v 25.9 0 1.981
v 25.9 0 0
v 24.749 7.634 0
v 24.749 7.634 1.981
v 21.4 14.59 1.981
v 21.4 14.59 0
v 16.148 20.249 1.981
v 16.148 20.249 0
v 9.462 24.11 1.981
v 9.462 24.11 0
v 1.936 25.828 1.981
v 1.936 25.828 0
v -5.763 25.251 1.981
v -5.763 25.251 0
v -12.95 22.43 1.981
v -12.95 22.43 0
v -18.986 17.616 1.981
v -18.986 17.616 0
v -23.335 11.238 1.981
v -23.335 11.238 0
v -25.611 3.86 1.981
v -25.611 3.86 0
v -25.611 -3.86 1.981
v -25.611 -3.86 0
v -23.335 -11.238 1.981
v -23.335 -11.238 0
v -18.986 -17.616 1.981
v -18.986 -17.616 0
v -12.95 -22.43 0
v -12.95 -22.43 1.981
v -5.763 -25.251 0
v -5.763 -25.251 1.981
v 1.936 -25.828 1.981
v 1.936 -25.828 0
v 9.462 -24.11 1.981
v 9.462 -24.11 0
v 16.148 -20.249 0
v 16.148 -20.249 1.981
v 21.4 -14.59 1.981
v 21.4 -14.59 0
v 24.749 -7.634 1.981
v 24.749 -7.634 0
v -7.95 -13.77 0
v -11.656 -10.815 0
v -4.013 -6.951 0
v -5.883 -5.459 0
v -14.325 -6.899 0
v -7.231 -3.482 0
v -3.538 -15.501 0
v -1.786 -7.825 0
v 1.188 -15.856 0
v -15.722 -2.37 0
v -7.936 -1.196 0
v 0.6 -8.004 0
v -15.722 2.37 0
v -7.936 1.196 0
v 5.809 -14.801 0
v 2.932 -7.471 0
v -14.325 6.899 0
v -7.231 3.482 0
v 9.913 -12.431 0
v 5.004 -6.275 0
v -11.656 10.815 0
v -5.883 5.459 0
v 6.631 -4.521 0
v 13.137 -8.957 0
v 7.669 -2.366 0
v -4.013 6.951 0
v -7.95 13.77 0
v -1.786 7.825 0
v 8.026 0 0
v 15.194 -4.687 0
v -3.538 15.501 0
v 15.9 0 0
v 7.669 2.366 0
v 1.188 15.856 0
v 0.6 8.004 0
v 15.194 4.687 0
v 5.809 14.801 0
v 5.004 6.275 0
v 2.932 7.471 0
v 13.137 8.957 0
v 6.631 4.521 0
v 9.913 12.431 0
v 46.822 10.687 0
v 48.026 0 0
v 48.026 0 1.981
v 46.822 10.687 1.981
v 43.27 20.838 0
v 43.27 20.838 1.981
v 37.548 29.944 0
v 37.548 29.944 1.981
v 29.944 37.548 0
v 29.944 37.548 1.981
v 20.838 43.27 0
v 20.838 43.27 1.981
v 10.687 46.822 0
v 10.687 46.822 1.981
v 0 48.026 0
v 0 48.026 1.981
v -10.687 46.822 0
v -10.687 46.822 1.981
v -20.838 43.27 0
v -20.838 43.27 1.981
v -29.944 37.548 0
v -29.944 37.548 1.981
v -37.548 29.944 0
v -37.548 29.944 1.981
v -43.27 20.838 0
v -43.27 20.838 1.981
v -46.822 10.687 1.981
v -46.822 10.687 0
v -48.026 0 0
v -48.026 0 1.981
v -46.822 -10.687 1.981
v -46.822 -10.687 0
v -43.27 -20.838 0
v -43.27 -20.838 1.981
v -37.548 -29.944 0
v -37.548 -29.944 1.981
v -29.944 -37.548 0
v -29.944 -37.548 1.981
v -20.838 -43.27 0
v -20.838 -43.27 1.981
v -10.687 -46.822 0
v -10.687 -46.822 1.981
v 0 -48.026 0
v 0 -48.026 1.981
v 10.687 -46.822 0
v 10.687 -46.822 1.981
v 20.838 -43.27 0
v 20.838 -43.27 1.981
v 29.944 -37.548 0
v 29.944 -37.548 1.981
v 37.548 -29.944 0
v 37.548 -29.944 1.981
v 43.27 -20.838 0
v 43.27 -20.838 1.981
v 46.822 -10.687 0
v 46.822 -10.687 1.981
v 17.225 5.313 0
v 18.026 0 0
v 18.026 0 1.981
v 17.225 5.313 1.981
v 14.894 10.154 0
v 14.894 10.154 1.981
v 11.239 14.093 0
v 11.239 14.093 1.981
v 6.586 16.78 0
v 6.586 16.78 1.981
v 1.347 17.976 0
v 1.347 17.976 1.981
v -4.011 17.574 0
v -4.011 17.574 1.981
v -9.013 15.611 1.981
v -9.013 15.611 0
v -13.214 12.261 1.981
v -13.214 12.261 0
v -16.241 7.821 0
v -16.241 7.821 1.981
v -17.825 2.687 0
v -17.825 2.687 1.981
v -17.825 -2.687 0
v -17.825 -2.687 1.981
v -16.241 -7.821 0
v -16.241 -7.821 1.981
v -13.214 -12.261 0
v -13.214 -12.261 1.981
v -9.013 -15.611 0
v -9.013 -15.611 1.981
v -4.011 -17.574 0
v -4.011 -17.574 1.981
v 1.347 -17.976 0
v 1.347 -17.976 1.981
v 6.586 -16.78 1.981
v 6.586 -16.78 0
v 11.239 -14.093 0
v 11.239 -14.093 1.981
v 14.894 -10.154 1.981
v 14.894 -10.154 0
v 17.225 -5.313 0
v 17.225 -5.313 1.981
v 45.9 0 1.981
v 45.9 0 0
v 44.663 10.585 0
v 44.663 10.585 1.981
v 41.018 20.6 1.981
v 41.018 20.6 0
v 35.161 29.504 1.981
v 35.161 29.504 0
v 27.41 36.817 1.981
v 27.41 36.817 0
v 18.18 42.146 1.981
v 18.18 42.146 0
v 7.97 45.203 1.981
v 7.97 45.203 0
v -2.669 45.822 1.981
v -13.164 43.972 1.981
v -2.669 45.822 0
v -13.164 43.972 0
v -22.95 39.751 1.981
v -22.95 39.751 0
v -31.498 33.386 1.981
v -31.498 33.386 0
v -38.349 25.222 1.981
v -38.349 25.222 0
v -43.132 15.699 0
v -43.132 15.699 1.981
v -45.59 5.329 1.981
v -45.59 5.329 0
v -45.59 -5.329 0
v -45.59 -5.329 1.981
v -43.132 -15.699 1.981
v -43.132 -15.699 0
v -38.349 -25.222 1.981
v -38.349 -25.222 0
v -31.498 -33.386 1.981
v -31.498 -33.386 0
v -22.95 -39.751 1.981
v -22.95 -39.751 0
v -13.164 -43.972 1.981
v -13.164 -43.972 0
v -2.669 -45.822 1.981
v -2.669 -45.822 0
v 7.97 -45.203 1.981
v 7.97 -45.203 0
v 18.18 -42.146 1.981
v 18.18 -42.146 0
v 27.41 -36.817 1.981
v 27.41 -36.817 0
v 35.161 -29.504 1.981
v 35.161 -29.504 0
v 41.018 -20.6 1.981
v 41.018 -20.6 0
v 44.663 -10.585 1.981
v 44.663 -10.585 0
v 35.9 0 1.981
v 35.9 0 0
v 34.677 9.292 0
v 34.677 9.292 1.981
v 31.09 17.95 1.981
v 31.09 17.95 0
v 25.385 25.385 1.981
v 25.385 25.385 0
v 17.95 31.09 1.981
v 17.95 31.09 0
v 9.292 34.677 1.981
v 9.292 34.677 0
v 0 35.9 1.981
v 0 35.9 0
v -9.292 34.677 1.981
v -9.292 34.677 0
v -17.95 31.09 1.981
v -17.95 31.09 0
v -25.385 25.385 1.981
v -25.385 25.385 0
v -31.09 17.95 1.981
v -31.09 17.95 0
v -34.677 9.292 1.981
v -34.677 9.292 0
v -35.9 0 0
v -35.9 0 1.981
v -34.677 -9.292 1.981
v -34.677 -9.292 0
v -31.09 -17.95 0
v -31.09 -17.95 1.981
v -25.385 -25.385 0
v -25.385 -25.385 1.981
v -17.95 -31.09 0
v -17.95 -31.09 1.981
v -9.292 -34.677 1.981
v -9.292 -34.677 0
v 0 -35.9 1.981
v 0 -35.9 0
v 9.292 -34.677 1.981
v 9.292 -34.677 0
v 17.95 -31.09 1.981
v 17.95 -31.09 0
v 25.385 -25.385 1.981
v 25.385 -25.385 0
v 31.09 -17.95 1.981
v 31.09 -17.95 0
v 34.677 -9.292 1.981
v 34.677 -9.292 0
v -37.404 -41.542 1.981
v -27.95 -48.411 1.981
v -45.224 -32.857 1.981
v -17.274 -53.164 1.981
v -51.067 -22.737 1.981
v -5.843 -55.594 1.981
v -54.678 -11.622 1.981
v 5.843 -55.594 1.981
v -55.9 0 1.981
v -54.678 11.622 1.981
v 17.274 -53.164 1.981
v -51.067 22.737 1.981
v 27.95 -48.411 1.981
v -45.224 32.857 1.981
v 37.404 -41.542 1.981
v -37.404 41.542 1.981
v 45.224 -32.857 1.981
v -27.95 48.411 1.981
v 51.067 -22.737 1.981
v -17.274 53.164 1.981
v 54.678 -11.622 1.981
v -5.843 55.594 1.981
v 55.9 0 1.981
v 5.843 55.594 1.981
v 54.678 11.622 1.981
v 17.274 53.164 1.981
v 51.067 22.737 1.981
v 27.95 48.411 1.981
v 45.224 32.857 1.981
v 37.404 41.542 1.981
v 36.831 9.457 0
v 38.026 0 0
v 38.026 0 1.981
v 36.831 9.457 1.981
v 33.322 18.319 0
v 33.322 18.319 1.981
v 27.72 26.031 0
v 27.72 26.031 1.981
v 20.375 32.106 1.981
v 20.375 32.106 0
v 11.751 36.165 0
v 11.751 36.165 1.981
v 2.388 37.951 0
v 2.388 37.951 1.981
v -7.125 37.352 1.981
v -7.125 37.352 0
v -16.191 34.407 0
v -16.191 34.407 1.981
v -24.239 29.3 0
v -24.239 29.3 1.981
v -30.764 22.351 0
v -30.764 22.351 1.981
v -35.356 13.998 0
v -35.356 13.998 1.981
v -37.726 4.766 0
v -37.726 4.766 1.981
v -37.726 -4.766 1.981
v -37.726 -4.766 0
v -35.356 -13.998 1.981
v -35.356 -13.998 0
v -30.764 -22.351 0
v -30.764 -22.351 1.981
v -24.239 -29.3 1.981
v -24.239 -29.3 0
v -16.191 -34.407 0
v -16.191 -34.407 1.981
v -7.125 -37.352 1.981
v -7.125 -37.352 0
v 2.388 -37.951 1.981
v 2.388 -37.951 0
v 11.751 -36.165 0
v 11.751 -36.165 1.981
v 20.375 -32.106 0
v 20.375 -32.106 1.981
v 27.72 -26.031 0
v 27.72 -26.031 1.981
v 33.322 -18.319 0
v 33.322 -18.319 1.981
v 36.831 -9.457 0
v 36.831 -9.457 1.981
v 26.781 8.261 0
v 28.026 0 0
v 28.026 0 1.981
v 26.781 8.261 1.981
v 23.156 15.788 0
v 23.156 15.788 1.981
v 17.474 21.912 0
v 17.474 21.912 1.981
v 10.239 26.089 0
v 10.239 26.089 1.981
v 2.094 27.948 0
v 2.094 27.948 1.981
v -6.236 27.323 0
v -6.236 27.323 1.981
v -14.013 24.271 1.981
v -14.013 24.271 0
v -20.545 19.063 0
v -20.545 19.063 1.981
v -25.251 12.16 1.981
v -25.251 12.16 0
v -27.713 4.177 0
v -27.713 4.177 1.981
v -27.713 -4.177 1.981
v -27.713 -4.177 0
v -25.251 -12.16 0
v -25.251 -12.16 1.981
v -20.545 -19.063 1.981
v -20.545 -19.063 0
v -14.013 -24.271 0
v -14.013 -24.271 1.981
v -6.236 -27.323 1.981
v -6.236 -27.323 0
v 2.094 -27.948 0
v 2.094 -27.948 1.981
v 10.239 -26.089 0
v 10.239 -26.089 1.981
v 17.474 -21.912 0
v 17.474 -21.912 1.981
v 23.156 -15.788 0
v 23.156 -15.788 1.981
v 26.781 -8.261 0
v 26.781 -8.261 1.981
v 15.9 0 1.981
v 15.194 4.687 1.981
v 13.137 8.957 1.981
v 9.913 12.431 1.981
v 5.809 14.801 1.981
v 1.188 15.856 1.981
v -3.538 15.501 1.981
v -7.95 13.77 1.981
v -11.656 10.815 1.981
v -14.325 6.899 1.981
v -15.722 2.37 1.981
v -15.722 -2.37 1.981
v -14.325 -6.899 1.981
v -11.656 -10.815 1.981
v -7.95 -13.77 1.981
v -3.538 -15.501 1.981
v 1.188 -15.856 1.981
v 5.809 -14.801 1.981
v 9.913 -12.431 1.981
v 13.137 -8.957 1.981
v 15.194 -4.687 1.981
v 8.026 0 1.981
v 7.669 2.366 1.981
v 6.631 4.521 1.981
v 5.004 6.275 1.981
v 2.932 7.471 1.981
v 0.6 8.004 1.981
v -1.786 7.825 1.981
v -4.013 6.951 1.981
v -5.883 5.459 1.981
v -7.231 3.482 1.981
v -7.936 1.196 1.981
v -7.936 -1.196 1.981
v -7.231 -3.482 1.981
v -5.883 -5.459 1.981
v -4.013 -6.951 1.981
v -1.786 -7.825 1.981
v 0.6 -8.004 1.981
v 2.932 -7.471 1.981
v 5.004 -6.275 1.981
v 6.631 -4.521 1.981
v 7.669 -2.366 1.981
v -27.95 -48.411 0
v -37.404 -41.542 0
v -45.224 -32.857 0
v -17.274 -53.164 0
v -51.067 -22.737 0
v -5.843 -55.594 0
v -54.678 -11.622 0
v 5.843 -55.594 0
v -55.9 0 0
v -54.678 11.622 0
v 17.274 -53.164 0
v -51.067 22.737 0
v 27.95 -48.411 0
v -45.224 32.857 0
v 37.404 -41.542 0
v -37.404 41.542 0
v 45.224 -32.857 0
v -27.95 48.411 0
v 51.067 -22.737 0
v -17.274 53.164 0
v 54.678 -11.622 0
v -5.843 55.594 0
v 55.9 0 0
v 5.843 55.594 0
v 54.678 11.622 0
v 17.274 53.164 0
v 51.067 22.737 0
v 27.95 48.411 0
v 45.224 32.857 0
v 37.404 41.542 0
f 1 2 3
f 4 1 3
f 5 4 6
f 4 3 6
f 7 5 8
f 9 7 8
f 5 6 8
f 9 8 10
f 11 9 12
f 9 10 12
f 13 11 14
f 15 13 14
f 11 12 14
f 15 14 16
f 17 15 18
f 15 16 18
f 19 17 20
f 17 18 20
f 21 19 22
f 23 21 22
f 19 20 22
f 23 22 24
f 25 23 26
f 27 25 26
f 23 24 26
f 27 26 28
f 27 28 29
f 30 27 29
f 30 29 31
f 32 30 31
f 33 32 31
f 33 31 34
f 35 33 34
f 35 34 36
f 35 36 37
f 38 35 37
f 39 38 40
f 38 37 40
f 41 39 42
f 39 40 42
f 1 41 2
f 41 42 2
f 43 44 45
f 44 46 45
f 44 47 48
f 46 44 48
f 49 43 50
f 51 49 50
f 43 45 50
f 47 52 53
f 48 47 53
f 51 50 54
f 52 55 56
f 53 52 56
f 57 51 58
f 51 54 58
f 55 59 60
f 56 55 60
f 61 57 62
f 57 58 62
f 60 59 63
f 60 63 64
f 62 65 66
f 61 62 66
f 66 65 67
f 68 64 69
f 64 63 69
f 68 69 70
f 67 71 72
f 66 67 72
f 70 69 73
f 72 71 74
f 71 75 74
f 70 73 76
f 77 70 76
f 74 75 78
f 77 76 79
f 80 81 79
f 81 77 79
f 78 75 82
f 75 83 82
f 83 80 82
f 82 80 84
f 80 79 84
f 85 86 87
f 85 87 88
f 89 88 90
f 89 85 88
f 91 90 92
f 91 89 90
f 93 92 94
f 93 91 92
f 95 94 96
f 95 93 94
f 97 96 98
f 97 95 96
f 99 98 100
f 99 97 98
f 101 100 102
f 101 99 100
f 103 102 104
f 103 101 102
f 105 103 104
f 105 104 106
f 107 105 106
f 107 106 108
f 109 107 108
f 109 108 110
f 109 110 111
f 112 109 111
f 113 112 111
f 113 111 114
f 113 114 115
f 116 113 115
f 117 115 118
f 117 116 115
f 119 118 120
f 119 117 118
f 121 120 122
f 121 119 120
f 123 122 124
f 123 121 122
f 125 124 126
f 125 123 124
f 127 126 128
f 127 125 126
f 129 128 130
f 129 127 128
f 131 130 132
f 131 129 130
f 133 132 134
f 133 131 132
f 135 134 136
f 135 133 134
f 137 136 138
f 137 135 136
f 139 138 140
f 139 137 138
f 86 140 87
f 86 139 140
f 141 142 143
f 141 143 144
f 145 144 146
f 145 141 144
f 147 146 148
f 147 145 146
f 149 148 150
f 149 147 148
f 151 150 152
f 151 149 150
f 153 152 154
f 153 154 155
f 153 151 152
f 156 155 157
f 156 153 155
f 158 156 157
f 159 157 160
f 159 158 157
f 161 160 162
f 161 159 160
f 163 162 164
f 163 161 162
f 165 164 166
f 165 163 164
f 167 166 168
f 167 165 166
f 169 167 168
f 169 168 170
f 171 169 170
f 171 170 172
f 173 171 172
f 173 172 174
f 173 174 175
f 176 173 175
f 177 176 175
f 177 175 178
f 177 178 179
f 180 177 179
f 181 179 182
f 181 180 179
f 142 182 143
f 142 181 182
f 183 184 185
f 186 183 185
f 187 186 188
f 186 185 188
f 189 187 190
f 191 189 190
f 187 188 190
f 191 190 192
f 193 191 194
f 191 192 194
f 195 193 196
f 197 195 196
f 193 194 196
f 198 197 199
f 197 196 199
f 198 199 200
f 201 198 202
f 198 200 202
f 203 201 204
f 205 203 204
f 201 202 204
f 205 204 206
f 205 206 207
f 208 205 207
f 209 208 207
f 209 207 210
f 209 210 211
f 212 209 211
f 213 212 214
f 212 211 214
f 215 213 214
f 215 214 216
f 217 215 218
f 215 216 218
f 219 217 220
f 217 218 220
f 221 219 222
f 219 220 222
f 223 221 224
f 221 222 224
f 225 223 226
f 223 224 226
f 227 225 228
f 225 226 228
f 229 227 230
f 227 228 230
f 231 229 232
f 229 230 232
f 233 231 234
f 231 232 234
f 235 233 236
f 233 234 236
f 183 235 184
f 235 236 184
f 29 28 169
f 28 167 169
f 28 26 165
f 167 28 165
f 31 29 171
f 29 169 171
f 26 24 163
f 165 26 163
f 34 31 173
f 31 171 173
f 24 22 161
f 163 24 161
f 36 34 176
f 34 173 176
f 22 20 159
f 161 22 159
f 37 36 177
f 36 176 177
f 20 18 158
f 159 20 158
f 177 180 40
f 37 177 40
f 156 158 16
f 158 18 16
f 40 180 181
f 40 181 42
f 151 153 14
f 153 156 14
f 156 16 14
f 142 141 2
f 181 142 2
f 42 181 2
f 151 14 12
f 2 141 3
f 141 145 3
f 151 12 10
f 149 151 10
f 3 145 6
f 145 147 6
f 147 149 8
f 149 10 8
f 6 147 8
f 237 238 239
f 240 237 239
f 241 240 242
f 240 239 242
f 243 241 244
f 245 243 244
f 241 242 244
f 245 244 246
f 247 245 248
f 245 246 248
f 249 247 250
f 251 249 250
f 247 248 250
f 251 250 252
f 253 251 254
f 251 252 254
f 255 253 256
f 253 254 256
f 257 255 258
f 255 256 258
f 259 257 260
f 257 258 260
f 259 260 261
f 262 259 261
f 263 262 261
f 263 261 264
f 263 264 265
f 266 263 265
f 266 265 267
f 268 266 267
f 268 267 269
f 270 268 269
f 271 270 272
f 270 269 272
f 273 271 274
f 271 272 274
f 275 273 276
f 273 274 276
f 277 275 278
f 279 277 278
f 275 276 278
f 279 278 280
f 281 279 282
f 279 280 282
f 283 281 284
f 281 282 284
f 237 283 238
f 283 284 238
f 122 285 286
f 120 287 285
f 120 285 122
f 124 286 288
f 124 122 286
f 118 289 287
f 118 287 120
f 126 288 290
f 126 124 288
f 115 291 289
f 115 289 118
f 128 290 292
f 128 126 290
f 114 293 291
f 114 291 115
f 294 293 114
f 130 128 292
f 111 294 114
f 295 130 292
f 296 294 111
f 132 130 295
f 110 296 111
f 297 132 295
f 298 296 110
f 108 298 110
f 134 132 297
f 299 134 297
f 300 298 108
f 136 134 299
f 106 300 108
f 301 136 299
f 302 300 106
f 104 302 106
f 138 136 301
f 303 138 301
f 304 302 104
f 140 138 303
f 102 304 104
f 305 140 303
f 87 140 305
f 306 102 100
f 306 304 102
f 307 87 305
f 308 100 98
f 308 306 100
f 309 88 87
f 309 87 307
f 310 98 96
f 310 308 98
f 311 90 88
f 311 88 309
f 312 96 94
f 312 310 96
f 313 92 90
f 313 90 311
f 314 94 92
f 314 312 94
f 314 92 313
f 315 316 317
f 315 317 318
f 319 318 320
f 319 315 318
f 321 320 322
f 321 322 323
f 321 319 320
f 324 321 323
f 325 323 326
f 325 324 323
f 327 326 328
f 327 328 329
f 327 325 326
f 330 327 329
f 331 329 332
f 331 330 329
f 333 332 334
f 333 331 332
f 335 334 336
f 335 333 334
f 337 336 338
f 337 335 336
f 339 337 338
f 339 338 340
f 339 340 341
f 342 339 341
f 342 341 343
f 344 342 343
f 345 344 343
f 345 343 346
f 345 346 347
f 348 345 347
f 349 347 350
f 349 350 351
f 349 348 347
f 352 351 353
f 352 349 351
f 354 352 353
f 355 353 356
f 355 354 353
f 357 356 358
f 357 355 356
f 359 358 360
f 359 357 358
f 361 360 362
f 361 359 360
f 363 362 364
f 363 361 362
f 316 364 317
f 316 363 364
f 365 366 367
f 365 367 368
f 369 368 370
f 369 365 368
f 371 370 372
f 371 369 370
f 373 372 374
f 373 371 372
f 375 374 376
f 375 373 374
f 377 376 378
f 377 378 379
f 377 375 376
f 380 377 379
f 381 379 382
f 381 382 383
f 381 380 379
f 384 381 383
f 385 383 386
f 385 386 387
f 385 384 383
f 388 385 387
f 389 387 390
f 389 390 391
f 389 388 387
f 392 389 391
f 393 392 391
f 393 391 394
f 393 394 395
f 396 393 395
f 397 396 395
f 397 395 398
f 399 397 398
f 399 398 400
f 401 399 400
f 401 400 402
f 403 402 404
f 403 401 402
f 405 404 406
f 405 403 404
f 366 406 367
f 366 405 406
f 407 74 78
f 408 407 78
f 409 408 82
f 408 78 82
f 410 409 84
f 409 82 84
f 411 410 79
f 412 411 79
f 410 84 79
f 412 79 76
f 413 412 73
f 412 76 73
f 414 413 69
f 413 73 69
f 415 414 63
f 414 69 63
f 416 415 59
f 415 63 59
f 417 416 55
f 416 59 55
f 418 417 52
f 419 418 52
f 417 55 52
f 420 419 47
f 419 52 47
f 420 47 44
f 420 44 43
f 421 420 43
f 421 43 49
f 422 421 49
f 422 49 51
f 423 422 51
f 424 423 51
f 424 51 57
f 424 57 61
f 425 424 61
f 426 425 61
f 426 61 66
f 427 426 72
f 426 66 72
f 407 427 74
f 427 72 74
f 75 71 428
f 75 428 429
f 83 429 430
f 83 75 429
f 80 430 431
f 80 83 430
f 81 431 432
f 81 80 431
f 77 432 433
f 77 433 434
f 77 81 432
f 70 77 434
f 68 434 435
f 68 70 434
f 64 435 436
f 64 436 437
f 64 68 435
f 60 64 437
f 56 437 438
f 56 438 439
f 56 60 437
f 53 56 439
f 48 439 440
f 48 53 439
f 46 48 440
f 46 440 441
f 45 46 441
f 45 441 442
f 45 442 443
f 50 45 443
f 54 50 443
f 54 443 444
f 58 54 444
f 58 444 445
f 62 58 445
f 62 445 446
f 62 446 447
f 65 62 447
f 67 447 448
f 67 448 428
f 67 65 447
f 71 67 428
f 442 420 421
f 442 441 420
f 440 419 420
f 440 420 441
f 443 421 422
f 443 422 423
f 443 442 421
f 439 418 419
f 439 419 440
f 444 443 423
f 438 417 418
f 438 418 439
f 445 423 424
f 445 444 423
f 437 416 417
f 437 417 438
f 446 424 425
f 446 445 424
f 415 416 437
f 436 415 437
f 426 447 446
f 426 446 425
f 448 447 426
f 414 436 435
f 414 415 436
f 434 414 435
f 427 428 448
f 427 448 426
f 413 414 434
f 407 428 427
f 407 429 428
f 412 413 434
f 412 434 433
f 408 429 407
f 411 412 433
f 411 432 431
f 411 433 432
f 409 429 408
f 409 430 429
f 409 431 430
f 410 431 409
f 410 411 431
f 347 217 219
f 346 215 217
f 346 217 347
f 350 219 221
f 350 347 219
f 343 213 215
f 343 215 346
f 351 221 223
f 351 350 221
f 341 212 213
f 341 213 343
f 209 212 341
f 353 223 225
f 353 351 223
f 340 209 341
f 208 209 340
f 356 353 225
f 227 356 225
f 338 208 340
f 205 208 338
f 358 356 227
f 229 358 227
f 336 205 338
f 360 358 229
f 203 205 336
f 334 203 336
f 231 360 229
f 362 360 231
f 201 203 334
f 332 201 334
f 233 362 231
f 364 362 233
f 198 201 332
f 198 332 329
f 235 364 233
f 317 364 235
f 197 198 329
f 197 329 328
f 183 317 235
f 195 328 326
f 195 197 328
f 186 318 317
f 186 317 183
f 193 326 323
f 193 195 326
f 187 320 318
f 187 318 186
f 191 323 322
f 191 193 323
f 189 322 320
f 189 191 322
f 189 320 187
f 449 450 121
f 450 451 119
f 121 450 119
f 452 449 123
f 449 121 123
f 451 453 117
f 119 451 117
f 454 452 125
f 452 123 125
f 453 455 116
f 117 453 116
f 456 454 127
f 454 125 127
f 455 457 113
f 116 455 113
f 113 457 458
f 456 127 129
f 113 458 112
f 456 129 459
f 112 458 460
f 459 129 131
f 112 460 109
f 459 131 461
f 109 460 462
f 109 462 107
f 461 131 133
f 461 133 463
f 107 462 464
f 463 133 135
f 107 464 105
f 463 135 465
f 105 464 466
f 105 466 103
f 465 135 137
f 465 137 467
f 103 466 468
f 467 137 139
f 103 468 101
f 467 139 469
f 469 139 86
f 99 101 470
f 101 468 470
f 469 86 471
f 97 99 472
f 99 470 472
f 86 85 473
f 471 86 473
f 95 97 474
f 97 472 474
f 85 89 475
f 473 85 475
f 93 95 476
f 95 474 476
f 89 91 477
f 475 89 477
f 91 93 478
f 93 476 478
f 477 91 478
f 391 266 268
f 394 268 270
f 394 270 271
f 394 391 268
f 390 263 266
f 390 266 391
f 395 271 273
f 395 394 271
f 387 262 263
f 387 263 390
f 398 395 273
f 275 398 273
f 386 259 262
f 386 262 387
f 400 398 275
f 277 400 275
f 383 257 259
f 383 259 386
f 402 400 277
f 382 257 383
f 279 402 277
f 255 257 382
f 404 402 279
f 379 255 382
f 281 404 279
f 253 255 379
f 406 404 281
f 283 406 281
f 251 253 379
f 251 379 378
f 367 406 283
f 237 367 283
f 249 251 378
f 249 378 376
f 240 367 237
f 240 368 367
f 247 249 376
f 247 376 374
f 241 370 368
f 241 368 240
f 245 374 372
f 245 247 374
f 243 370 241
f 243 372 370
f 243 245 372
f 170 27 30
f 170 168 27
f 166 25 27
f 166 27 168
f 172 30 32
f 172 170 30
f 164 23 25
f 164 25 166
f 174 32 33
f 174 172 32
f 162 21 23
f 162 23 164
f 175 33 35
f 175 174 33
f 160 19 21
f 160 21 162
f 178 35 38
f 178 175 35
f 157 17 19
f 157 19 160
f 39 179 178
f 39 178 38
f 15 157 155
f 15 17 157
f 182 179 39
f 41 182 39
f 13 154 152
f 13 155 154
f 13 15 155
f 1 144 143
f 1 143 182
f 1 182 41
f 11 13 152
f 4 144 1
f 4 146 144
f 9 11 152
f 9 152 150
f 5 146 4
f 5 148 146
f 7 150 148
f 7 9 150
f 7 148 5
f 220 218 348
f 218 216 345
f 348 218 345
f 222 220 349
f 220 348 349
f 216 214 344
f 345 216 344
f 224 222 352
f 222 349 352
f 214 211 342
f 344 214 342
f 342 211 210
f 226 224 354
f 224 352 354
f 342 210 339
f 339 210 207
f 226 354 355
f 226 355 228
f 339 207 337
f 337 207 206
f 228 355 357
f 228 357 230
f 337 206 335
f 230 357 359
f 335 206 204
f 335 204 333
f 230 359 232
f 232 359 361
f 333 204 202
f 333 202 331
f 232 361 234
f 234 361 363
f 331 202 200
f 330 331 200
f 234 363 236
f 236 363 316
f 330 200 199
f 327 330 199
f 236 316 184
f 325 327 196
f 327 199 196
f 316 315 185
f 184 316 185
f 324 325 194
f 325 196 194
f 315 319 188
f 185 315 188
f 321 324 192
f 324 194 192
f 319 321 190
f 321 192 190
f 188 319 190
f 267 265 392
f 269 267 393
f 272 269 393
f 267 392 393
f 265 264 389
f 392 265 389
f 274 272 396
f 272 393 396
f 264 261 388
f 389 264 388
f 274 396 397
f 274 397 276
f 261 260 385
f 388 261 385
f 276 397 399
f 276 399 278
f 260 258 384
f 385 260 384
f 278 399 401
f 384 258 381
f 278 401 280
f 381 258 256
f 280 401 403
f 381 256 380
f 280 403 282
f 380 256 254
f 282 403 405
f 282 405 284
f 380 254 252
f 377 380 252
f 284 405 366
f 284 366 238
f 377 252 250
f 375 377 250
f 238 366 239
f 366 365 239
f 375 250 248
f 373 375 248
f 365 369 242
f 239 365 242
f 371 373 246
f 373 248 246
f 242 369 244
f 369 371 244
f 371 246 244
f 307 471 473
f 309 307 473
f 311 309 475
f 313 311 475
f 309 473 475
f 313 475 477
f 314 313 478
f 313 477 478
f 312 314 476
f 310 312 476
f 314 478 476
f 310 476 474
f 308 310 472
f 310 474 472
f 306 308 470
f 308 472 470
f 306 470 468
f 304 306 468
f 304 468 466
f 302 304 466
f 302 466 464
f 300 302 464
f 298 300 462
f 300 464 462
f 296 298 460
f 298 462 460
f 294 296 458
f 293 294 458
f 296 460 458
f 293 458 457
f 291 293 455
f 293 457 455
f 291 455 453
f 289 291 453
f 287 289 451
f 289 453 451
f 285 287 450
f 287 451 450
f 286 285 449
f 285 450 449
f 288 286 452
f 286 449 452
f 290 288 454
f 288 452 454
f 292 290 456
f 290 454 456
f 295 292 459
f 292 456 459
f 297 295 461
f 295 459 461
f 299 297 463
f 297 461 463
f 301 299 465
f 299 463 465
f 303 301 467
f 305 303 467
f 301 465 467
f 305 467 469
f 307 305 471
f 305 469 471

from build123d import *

# Parameters (mm, degrees)
SKETCH1_R             = 55.9
SKETCH1_R_2           = 48.026
BOSS_EXTRUDE1_DEPTH   = 1.9812
SKETCH1_R_3           = 45.9
SKETCH1_R_4           = 38.026
BOSS_EXTRUDE1_2_DEPTH = 1.9812
SKETCH1_R_5           = 35.9
SKETCH1_R_6           = 28.026
BOSS_EXTRUDE1_3_DEPTH = 1.9812
SKETCH1_R_7           = 25.9
SKETCH1_R_8           = 18.026
BOSS_EXTRUDE1_4_DEPTH = 1.9812
SKETCH1_R_9           = 15.9
SKETCH1_R_10          = 8.026
BOSS_EXTRUDE1_5_DEPTH = 1.9812


with BuildPart() as part:
    # Sketch1 → Boss-Extrude1 (new body)
    with BuildSketch(Plane.XY):
        Circle(SKETCH1_R)
        Circle(SKETCH1_R_2, mode=Mode.SUBTRACT)
    extrude(amount=BOSS_EXTRUDE1_DEPTH)


with BuildPart() as body_2:
    # Sketch1 → Boss-Extrude1 2 (new body)
    with BuildSketch(Plane.XY):
        Circle(SKETCH1_R_3)
        Circle(SKETCH1_R_4, mode=Mode.SUBTRACT)
    extrude(amount=BOSS_EXTRUDE1_2_DEPTH)


with BuildPart() as body_3:
    # Sketch1 → Boss-Extrude1 3 (new body)
    with BuildSketch(Plane.XY):
        Circle(SKETCH1_R_5)
        Circle(SKETCH1_R_6, mode=Mode.SUBTRACT)
    extrude(amount=BOSS_EXTRUDE1_3_DEPTH)


with BuildPart() as body_4:
    # Sketch1 → Boss-Extrude1 4 (new body)
    with BuildSketch(Plane.XY):
        Circle(SKETCH1_R_7)
        Circle(SKETCH1_R_8, mode=Mode.SUBTRACT)
    extrude(amount=BOSS_EXTRUDE1_4_DEPTH)


with BuildPart() as body_5:
    # Sketch1 → Boss-Extrude1 5 (new body)
    with BuildSketch(Plane.XY):
        Circle(SKETCH1_R_9)
        Circle(SKETCH1_R_10, mode=Mode.SUBTRACT)
    extrude(amount=BOSS_EXTRUDE1_5_DEPTH)


solid = Compound([part.part, body_2.part, body_3.part, body_4.part, body_5.part])
